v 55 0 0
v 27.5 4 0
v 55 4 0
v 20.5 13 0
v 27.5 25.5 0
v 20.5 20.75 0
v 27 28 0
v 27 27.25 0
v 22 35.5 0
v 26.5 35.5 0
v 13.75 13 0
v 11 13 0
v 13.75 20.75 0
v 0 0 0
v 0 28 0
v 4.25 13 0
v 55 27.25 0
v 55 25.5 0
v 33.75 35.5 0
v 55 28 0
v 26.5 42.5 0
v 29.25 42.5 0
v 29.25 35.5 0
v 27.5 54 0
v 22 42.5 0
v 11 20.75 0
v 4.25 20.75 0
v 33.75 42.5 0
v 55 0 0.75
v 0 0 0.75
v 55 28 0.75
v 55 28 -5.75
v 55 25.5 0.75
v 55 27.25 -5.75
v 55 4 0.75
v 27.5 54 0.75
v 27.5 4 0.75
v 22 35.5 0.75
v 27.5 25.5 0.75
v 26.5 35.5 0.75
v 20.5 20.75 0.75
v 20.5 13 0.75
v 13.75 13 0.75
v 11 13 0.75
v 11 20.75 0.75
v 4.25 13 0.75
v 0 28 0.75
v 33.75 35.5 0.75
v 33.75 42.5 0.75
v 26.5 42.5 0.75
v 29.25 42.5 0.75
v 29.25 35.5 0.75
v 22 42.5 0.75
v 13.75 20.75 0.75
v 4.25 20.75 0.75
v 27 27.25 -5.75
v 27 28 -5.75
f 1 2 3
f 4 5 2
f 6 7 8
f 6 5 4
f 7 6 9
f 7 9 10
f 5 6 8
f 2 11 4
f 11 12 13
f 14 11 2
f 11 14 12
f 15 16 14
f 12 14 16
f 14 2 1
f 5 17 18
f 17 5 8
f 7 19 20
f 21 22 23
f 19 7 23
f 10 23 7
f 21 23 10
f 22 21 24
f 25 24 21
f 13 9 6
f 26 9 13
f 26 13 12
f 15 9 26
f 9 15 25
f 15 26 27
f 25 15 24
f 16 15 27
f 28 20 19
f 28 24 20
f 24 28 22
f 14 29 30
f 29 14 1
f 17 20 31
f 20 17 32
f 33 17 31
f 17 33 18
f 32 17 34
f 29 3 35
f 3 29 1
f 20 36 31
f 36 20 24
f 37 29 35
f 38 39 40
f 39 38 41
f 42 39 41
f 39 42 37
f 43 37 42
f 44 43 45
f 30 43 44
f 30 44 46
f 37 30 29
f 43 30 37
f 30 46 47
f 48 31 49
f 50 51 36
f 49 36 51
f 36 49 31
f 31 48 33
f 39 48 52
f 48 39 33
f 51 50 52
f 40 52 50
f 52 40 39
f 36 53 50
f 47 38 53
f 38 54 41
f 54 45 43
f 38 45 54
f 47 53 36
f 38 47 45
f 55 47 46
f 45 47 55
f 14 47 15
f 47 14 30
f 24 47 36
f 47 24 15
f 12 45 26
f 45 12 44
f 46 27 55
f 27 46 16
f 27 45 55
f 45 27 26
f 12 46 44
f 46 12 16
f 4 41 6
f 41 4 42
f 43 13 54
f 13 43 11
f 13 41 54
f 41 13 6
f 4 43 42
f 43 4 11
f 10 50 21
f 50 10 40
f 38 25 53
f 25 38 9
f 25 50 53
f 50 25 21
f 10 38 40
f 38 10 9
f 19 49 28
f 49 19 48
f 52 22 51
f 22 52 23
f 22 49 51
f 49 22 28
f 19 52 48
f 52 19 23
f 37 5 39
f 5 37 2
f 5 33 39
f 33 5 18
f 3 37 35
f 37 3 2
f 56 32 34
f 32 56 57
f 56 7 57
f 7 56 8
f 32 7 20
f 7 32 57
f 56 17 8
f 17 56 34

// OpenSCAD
/*
    Projekt Name: Trennwaende fuer das Modellhaus 3723
    Modul:  Wand Suedseite Fotogeschaeft
    Projekt URL: https://github.com/Hardi-St/MobaLedLib_Docu/tree/master/3D_Daten_fuer_die_MobaLedLib/Trennwände%20für%20Häuser
    Version: 0.0.1
    Autor: Moba-Nick (mobanick@wp12085804.server-he.de)
    Lizenz: CC-BY-SA-4.0 (https://creativecommons.org/licenses/by-sa/4.0/legalcode.de)
*/
//  Alle Angaben sind immer in mm bei meinen Projekten.
//  Parameter fuer die Wand
x_all = 55;  //Breite der Wand = Breite der Grundplatte
z_all = 0.75; //Wandstaerke gibnt an, wie Dick die Wand ist. 0.75 ist dick genug um kein Licht durchzulassen, aber duenn genug um Material zu sparen.
y_erdgeschoss = 28;     //Hoehe Erdgeschoss 
y_dachschraege = 26;    // Hoehe Dachgeschoss
y_all = y_erdgeschoss + y_dachschraege;

/*  Der Parameter "$fn" sagt, wie rund die Ausschnitte von Kreisen sind. Je hoeher die Zahl desto mehr Kreispunkte werden verwendet. Minimum ist 3, Maximum ist 999 (Ich nehme nie mehr als 150 sonst wird die Berechnungszeit zu gross). Als ideal haben sich Werte zwischen 35 und 45 ergeben. 
    Bei 3 wird es ein Dreieck, bei 4 eine Raute.
*/
$fn=40;
/* 
    Hier erfolgt die eigentliche Arbeit. Als erstes wird die komplette Wand erstellt mit Hilfe des Modules "HauptWand()". 
    Danach werden alle weiteren Elemente die in der Funktion "difference()" erstellt aus dieser Wand ausgeschnitten. Dadurch ergeben sich die Oeffnungen fuer die Fenster und Tueren, damit da Licht durchscheinen kann. 
    Weitere Informatioen zur Funktion "difference()" gibt es hier https://en.wikibooks.org/wiki/OpenSCAD_User_Manual/CSG_Modelling#difference
*/
difference(){
    HauptWand();
    
    // 1. Fenster links unten
    Fenster(-23.25,13.00,6.75,7.75);
    // 2. Fenster links unten
    Fenster(-13.75,13.00,6.75,7.75);
    
    // 1. Fenster links oben
    Fenster(-5.5,35.5,4.5,7.00);
    // 2. Fenster rechts oben
    Fenster(1.75,35.5,4.5,7.00);
    
    // Schaufenster
    Fenster(0,4,30,21.5);
}

// Kante über dem Schaufenster als Lichtschutz
translate([x_all/2-0.5,y_erdgeschoss-z_all,0-5.75]){
    cube([x_all/2+0.5,z_all,5.75],false);
}



/* 
!!!!!!!!!!!!!!!!!!!!!!!!!!!!!!!!!!!!!!!!!!!!!!!!!!!!!!!!!!!!!!!!!!!    
!!!!    Ab hier kommen die Module. Bitte nur aendern wann man   !!!!
!!!!    weiss was man macht.                                    !!!!
!!!!!!!!!!!!!!!!!!!!!!!!!!!!!!!!!!!!!!!!!!!!!!!!!!!!!!!!!!!!!!!!!!!
/*  
    Das Module HauptWand erstellt die Wand des Hauses inkl. der Dachschraege aus einen Polyhydron. Dazu wurde im Bereich fuer die Parameter in den  Zeilen 10 - 14 die Werte fuer die Breite der Wand (x_all) sowie die Höhe des Erdgeschosses (y_erdgeschoss) und des oberen Stockwerks (y_dachschraege) angeben.
*/
module HauptWand(){   
    //  PolyPunkte gibt an wo sicher welcher Punkt befindet. 
    //  Die Korrdinaten werden immer im Format [x,y,z] uebergeben.
    PolyPunkte = [
    [0,0,0],    // 0
    [0,y_erdgeschoss,0],    // 1
    [x_all/2,y_all,0],    // 2
    [x_all,y_erdgeschoss,0],    // 3
    [x_all,0,0],    // 4
    [0,0,z_all],    // 5
    [x_all,0,z_all],    // 6
    [x_all,y_erdgeschoss,z_all],    // 7
    [x_all/2,y_all,z_all],    // 8
    [0,y_erdgeschoss,z_all]];    // 9
    
    //  PolyFlaechen gibt an welche Punkte welche Flaechen beschreiben. 
    //  Die Korrdinaten werden immer im Format [x,y,z] uebergeben.
    PolyFlaechen =[
    [0,1,2,3,4],    // Unten (Boden)
    [5,0,4,6],      // Vorne (vordere Kante)
    [6,4,3,7],      // Rechts unten (Erdgeschoss)
    [7,3,2,8],      // Rechts oben  (Dachgeschoss/Dachschraege)
    [6,7,8,9,5],    // Oben (Deckel)
    [9,1,0,5],      // Links unten  (Erdgeschoss)
    [8,2,1,9]];     // Links oben   (Dachgeschoss/Dachschraege)
      
    polyhedron( PolyPunkte, PolyFlaechen );
}

/*  
    Das Module Fenster erstellt wie der Name schon sagt, die Ausschnitte fuer die Fenster.
    Dabei gibt es 4 Variablen die uebergeben werden.
    "pos_x" gibt die Startposition des linken unteren Ecke im Bezug zur Mittelachse des Hauses an.
    "pos_y" gibt die Startposition der inken untren Ecke im Bezug zur Grundplatte an.
    "size_x" gibt die Breite des Fensters an
    "size_y" gibt die Hoehe des Fensters an
    Beispiel: Der Befehl "Fenster(10,20,15,10);" erzeugt ein Fenster 10mm von der Mitte nach Rechts, auf der Hoehe von 20mm mit einer Breite von 15mm und einer Hoehe von 10mm;
*/
module Fenster(pos_x, pos_y, size_x, size_y){
    translate([x_all/2+pos_x, pos_y, 0]){
        cube([size_x,size_y,z_all*1.25],false);
    }
}

/*  
    Das Module Fenster_rund erstellt wie der Name schon sagt, die Ausschnitte fuer die Fenster mit rundem Ausschnitt.
    Dabei gibt es 3 Variablen die uebergeben werden.
    "pos_x" gibt die Startposition der linken unteren Ecke im Bezug zur Mittelachse des Hauses an.
    "pos_y" gibt die Startposition der inken unteren Ecke im Bezug zur Grundplatte an.
    "size_x" gibt die Breite des Fensters an
    Beispiel: Der Befehl "Fenster_rund(10,20,5);" erzeugt ein Fenster 10mm von der Mitte nach Rechts, auf der Hoehe von 20mm mit einem Durchmesser von 5mm;
*/
module Fenster_Rund(pos_x, pos_y, size_x){
    
    translate([x_all/2+pos_x+size_x/2, pos_y+size_x/2, 0]){
        cylinder(h=z_all*1.25,d=size_x,false);
    }
}
